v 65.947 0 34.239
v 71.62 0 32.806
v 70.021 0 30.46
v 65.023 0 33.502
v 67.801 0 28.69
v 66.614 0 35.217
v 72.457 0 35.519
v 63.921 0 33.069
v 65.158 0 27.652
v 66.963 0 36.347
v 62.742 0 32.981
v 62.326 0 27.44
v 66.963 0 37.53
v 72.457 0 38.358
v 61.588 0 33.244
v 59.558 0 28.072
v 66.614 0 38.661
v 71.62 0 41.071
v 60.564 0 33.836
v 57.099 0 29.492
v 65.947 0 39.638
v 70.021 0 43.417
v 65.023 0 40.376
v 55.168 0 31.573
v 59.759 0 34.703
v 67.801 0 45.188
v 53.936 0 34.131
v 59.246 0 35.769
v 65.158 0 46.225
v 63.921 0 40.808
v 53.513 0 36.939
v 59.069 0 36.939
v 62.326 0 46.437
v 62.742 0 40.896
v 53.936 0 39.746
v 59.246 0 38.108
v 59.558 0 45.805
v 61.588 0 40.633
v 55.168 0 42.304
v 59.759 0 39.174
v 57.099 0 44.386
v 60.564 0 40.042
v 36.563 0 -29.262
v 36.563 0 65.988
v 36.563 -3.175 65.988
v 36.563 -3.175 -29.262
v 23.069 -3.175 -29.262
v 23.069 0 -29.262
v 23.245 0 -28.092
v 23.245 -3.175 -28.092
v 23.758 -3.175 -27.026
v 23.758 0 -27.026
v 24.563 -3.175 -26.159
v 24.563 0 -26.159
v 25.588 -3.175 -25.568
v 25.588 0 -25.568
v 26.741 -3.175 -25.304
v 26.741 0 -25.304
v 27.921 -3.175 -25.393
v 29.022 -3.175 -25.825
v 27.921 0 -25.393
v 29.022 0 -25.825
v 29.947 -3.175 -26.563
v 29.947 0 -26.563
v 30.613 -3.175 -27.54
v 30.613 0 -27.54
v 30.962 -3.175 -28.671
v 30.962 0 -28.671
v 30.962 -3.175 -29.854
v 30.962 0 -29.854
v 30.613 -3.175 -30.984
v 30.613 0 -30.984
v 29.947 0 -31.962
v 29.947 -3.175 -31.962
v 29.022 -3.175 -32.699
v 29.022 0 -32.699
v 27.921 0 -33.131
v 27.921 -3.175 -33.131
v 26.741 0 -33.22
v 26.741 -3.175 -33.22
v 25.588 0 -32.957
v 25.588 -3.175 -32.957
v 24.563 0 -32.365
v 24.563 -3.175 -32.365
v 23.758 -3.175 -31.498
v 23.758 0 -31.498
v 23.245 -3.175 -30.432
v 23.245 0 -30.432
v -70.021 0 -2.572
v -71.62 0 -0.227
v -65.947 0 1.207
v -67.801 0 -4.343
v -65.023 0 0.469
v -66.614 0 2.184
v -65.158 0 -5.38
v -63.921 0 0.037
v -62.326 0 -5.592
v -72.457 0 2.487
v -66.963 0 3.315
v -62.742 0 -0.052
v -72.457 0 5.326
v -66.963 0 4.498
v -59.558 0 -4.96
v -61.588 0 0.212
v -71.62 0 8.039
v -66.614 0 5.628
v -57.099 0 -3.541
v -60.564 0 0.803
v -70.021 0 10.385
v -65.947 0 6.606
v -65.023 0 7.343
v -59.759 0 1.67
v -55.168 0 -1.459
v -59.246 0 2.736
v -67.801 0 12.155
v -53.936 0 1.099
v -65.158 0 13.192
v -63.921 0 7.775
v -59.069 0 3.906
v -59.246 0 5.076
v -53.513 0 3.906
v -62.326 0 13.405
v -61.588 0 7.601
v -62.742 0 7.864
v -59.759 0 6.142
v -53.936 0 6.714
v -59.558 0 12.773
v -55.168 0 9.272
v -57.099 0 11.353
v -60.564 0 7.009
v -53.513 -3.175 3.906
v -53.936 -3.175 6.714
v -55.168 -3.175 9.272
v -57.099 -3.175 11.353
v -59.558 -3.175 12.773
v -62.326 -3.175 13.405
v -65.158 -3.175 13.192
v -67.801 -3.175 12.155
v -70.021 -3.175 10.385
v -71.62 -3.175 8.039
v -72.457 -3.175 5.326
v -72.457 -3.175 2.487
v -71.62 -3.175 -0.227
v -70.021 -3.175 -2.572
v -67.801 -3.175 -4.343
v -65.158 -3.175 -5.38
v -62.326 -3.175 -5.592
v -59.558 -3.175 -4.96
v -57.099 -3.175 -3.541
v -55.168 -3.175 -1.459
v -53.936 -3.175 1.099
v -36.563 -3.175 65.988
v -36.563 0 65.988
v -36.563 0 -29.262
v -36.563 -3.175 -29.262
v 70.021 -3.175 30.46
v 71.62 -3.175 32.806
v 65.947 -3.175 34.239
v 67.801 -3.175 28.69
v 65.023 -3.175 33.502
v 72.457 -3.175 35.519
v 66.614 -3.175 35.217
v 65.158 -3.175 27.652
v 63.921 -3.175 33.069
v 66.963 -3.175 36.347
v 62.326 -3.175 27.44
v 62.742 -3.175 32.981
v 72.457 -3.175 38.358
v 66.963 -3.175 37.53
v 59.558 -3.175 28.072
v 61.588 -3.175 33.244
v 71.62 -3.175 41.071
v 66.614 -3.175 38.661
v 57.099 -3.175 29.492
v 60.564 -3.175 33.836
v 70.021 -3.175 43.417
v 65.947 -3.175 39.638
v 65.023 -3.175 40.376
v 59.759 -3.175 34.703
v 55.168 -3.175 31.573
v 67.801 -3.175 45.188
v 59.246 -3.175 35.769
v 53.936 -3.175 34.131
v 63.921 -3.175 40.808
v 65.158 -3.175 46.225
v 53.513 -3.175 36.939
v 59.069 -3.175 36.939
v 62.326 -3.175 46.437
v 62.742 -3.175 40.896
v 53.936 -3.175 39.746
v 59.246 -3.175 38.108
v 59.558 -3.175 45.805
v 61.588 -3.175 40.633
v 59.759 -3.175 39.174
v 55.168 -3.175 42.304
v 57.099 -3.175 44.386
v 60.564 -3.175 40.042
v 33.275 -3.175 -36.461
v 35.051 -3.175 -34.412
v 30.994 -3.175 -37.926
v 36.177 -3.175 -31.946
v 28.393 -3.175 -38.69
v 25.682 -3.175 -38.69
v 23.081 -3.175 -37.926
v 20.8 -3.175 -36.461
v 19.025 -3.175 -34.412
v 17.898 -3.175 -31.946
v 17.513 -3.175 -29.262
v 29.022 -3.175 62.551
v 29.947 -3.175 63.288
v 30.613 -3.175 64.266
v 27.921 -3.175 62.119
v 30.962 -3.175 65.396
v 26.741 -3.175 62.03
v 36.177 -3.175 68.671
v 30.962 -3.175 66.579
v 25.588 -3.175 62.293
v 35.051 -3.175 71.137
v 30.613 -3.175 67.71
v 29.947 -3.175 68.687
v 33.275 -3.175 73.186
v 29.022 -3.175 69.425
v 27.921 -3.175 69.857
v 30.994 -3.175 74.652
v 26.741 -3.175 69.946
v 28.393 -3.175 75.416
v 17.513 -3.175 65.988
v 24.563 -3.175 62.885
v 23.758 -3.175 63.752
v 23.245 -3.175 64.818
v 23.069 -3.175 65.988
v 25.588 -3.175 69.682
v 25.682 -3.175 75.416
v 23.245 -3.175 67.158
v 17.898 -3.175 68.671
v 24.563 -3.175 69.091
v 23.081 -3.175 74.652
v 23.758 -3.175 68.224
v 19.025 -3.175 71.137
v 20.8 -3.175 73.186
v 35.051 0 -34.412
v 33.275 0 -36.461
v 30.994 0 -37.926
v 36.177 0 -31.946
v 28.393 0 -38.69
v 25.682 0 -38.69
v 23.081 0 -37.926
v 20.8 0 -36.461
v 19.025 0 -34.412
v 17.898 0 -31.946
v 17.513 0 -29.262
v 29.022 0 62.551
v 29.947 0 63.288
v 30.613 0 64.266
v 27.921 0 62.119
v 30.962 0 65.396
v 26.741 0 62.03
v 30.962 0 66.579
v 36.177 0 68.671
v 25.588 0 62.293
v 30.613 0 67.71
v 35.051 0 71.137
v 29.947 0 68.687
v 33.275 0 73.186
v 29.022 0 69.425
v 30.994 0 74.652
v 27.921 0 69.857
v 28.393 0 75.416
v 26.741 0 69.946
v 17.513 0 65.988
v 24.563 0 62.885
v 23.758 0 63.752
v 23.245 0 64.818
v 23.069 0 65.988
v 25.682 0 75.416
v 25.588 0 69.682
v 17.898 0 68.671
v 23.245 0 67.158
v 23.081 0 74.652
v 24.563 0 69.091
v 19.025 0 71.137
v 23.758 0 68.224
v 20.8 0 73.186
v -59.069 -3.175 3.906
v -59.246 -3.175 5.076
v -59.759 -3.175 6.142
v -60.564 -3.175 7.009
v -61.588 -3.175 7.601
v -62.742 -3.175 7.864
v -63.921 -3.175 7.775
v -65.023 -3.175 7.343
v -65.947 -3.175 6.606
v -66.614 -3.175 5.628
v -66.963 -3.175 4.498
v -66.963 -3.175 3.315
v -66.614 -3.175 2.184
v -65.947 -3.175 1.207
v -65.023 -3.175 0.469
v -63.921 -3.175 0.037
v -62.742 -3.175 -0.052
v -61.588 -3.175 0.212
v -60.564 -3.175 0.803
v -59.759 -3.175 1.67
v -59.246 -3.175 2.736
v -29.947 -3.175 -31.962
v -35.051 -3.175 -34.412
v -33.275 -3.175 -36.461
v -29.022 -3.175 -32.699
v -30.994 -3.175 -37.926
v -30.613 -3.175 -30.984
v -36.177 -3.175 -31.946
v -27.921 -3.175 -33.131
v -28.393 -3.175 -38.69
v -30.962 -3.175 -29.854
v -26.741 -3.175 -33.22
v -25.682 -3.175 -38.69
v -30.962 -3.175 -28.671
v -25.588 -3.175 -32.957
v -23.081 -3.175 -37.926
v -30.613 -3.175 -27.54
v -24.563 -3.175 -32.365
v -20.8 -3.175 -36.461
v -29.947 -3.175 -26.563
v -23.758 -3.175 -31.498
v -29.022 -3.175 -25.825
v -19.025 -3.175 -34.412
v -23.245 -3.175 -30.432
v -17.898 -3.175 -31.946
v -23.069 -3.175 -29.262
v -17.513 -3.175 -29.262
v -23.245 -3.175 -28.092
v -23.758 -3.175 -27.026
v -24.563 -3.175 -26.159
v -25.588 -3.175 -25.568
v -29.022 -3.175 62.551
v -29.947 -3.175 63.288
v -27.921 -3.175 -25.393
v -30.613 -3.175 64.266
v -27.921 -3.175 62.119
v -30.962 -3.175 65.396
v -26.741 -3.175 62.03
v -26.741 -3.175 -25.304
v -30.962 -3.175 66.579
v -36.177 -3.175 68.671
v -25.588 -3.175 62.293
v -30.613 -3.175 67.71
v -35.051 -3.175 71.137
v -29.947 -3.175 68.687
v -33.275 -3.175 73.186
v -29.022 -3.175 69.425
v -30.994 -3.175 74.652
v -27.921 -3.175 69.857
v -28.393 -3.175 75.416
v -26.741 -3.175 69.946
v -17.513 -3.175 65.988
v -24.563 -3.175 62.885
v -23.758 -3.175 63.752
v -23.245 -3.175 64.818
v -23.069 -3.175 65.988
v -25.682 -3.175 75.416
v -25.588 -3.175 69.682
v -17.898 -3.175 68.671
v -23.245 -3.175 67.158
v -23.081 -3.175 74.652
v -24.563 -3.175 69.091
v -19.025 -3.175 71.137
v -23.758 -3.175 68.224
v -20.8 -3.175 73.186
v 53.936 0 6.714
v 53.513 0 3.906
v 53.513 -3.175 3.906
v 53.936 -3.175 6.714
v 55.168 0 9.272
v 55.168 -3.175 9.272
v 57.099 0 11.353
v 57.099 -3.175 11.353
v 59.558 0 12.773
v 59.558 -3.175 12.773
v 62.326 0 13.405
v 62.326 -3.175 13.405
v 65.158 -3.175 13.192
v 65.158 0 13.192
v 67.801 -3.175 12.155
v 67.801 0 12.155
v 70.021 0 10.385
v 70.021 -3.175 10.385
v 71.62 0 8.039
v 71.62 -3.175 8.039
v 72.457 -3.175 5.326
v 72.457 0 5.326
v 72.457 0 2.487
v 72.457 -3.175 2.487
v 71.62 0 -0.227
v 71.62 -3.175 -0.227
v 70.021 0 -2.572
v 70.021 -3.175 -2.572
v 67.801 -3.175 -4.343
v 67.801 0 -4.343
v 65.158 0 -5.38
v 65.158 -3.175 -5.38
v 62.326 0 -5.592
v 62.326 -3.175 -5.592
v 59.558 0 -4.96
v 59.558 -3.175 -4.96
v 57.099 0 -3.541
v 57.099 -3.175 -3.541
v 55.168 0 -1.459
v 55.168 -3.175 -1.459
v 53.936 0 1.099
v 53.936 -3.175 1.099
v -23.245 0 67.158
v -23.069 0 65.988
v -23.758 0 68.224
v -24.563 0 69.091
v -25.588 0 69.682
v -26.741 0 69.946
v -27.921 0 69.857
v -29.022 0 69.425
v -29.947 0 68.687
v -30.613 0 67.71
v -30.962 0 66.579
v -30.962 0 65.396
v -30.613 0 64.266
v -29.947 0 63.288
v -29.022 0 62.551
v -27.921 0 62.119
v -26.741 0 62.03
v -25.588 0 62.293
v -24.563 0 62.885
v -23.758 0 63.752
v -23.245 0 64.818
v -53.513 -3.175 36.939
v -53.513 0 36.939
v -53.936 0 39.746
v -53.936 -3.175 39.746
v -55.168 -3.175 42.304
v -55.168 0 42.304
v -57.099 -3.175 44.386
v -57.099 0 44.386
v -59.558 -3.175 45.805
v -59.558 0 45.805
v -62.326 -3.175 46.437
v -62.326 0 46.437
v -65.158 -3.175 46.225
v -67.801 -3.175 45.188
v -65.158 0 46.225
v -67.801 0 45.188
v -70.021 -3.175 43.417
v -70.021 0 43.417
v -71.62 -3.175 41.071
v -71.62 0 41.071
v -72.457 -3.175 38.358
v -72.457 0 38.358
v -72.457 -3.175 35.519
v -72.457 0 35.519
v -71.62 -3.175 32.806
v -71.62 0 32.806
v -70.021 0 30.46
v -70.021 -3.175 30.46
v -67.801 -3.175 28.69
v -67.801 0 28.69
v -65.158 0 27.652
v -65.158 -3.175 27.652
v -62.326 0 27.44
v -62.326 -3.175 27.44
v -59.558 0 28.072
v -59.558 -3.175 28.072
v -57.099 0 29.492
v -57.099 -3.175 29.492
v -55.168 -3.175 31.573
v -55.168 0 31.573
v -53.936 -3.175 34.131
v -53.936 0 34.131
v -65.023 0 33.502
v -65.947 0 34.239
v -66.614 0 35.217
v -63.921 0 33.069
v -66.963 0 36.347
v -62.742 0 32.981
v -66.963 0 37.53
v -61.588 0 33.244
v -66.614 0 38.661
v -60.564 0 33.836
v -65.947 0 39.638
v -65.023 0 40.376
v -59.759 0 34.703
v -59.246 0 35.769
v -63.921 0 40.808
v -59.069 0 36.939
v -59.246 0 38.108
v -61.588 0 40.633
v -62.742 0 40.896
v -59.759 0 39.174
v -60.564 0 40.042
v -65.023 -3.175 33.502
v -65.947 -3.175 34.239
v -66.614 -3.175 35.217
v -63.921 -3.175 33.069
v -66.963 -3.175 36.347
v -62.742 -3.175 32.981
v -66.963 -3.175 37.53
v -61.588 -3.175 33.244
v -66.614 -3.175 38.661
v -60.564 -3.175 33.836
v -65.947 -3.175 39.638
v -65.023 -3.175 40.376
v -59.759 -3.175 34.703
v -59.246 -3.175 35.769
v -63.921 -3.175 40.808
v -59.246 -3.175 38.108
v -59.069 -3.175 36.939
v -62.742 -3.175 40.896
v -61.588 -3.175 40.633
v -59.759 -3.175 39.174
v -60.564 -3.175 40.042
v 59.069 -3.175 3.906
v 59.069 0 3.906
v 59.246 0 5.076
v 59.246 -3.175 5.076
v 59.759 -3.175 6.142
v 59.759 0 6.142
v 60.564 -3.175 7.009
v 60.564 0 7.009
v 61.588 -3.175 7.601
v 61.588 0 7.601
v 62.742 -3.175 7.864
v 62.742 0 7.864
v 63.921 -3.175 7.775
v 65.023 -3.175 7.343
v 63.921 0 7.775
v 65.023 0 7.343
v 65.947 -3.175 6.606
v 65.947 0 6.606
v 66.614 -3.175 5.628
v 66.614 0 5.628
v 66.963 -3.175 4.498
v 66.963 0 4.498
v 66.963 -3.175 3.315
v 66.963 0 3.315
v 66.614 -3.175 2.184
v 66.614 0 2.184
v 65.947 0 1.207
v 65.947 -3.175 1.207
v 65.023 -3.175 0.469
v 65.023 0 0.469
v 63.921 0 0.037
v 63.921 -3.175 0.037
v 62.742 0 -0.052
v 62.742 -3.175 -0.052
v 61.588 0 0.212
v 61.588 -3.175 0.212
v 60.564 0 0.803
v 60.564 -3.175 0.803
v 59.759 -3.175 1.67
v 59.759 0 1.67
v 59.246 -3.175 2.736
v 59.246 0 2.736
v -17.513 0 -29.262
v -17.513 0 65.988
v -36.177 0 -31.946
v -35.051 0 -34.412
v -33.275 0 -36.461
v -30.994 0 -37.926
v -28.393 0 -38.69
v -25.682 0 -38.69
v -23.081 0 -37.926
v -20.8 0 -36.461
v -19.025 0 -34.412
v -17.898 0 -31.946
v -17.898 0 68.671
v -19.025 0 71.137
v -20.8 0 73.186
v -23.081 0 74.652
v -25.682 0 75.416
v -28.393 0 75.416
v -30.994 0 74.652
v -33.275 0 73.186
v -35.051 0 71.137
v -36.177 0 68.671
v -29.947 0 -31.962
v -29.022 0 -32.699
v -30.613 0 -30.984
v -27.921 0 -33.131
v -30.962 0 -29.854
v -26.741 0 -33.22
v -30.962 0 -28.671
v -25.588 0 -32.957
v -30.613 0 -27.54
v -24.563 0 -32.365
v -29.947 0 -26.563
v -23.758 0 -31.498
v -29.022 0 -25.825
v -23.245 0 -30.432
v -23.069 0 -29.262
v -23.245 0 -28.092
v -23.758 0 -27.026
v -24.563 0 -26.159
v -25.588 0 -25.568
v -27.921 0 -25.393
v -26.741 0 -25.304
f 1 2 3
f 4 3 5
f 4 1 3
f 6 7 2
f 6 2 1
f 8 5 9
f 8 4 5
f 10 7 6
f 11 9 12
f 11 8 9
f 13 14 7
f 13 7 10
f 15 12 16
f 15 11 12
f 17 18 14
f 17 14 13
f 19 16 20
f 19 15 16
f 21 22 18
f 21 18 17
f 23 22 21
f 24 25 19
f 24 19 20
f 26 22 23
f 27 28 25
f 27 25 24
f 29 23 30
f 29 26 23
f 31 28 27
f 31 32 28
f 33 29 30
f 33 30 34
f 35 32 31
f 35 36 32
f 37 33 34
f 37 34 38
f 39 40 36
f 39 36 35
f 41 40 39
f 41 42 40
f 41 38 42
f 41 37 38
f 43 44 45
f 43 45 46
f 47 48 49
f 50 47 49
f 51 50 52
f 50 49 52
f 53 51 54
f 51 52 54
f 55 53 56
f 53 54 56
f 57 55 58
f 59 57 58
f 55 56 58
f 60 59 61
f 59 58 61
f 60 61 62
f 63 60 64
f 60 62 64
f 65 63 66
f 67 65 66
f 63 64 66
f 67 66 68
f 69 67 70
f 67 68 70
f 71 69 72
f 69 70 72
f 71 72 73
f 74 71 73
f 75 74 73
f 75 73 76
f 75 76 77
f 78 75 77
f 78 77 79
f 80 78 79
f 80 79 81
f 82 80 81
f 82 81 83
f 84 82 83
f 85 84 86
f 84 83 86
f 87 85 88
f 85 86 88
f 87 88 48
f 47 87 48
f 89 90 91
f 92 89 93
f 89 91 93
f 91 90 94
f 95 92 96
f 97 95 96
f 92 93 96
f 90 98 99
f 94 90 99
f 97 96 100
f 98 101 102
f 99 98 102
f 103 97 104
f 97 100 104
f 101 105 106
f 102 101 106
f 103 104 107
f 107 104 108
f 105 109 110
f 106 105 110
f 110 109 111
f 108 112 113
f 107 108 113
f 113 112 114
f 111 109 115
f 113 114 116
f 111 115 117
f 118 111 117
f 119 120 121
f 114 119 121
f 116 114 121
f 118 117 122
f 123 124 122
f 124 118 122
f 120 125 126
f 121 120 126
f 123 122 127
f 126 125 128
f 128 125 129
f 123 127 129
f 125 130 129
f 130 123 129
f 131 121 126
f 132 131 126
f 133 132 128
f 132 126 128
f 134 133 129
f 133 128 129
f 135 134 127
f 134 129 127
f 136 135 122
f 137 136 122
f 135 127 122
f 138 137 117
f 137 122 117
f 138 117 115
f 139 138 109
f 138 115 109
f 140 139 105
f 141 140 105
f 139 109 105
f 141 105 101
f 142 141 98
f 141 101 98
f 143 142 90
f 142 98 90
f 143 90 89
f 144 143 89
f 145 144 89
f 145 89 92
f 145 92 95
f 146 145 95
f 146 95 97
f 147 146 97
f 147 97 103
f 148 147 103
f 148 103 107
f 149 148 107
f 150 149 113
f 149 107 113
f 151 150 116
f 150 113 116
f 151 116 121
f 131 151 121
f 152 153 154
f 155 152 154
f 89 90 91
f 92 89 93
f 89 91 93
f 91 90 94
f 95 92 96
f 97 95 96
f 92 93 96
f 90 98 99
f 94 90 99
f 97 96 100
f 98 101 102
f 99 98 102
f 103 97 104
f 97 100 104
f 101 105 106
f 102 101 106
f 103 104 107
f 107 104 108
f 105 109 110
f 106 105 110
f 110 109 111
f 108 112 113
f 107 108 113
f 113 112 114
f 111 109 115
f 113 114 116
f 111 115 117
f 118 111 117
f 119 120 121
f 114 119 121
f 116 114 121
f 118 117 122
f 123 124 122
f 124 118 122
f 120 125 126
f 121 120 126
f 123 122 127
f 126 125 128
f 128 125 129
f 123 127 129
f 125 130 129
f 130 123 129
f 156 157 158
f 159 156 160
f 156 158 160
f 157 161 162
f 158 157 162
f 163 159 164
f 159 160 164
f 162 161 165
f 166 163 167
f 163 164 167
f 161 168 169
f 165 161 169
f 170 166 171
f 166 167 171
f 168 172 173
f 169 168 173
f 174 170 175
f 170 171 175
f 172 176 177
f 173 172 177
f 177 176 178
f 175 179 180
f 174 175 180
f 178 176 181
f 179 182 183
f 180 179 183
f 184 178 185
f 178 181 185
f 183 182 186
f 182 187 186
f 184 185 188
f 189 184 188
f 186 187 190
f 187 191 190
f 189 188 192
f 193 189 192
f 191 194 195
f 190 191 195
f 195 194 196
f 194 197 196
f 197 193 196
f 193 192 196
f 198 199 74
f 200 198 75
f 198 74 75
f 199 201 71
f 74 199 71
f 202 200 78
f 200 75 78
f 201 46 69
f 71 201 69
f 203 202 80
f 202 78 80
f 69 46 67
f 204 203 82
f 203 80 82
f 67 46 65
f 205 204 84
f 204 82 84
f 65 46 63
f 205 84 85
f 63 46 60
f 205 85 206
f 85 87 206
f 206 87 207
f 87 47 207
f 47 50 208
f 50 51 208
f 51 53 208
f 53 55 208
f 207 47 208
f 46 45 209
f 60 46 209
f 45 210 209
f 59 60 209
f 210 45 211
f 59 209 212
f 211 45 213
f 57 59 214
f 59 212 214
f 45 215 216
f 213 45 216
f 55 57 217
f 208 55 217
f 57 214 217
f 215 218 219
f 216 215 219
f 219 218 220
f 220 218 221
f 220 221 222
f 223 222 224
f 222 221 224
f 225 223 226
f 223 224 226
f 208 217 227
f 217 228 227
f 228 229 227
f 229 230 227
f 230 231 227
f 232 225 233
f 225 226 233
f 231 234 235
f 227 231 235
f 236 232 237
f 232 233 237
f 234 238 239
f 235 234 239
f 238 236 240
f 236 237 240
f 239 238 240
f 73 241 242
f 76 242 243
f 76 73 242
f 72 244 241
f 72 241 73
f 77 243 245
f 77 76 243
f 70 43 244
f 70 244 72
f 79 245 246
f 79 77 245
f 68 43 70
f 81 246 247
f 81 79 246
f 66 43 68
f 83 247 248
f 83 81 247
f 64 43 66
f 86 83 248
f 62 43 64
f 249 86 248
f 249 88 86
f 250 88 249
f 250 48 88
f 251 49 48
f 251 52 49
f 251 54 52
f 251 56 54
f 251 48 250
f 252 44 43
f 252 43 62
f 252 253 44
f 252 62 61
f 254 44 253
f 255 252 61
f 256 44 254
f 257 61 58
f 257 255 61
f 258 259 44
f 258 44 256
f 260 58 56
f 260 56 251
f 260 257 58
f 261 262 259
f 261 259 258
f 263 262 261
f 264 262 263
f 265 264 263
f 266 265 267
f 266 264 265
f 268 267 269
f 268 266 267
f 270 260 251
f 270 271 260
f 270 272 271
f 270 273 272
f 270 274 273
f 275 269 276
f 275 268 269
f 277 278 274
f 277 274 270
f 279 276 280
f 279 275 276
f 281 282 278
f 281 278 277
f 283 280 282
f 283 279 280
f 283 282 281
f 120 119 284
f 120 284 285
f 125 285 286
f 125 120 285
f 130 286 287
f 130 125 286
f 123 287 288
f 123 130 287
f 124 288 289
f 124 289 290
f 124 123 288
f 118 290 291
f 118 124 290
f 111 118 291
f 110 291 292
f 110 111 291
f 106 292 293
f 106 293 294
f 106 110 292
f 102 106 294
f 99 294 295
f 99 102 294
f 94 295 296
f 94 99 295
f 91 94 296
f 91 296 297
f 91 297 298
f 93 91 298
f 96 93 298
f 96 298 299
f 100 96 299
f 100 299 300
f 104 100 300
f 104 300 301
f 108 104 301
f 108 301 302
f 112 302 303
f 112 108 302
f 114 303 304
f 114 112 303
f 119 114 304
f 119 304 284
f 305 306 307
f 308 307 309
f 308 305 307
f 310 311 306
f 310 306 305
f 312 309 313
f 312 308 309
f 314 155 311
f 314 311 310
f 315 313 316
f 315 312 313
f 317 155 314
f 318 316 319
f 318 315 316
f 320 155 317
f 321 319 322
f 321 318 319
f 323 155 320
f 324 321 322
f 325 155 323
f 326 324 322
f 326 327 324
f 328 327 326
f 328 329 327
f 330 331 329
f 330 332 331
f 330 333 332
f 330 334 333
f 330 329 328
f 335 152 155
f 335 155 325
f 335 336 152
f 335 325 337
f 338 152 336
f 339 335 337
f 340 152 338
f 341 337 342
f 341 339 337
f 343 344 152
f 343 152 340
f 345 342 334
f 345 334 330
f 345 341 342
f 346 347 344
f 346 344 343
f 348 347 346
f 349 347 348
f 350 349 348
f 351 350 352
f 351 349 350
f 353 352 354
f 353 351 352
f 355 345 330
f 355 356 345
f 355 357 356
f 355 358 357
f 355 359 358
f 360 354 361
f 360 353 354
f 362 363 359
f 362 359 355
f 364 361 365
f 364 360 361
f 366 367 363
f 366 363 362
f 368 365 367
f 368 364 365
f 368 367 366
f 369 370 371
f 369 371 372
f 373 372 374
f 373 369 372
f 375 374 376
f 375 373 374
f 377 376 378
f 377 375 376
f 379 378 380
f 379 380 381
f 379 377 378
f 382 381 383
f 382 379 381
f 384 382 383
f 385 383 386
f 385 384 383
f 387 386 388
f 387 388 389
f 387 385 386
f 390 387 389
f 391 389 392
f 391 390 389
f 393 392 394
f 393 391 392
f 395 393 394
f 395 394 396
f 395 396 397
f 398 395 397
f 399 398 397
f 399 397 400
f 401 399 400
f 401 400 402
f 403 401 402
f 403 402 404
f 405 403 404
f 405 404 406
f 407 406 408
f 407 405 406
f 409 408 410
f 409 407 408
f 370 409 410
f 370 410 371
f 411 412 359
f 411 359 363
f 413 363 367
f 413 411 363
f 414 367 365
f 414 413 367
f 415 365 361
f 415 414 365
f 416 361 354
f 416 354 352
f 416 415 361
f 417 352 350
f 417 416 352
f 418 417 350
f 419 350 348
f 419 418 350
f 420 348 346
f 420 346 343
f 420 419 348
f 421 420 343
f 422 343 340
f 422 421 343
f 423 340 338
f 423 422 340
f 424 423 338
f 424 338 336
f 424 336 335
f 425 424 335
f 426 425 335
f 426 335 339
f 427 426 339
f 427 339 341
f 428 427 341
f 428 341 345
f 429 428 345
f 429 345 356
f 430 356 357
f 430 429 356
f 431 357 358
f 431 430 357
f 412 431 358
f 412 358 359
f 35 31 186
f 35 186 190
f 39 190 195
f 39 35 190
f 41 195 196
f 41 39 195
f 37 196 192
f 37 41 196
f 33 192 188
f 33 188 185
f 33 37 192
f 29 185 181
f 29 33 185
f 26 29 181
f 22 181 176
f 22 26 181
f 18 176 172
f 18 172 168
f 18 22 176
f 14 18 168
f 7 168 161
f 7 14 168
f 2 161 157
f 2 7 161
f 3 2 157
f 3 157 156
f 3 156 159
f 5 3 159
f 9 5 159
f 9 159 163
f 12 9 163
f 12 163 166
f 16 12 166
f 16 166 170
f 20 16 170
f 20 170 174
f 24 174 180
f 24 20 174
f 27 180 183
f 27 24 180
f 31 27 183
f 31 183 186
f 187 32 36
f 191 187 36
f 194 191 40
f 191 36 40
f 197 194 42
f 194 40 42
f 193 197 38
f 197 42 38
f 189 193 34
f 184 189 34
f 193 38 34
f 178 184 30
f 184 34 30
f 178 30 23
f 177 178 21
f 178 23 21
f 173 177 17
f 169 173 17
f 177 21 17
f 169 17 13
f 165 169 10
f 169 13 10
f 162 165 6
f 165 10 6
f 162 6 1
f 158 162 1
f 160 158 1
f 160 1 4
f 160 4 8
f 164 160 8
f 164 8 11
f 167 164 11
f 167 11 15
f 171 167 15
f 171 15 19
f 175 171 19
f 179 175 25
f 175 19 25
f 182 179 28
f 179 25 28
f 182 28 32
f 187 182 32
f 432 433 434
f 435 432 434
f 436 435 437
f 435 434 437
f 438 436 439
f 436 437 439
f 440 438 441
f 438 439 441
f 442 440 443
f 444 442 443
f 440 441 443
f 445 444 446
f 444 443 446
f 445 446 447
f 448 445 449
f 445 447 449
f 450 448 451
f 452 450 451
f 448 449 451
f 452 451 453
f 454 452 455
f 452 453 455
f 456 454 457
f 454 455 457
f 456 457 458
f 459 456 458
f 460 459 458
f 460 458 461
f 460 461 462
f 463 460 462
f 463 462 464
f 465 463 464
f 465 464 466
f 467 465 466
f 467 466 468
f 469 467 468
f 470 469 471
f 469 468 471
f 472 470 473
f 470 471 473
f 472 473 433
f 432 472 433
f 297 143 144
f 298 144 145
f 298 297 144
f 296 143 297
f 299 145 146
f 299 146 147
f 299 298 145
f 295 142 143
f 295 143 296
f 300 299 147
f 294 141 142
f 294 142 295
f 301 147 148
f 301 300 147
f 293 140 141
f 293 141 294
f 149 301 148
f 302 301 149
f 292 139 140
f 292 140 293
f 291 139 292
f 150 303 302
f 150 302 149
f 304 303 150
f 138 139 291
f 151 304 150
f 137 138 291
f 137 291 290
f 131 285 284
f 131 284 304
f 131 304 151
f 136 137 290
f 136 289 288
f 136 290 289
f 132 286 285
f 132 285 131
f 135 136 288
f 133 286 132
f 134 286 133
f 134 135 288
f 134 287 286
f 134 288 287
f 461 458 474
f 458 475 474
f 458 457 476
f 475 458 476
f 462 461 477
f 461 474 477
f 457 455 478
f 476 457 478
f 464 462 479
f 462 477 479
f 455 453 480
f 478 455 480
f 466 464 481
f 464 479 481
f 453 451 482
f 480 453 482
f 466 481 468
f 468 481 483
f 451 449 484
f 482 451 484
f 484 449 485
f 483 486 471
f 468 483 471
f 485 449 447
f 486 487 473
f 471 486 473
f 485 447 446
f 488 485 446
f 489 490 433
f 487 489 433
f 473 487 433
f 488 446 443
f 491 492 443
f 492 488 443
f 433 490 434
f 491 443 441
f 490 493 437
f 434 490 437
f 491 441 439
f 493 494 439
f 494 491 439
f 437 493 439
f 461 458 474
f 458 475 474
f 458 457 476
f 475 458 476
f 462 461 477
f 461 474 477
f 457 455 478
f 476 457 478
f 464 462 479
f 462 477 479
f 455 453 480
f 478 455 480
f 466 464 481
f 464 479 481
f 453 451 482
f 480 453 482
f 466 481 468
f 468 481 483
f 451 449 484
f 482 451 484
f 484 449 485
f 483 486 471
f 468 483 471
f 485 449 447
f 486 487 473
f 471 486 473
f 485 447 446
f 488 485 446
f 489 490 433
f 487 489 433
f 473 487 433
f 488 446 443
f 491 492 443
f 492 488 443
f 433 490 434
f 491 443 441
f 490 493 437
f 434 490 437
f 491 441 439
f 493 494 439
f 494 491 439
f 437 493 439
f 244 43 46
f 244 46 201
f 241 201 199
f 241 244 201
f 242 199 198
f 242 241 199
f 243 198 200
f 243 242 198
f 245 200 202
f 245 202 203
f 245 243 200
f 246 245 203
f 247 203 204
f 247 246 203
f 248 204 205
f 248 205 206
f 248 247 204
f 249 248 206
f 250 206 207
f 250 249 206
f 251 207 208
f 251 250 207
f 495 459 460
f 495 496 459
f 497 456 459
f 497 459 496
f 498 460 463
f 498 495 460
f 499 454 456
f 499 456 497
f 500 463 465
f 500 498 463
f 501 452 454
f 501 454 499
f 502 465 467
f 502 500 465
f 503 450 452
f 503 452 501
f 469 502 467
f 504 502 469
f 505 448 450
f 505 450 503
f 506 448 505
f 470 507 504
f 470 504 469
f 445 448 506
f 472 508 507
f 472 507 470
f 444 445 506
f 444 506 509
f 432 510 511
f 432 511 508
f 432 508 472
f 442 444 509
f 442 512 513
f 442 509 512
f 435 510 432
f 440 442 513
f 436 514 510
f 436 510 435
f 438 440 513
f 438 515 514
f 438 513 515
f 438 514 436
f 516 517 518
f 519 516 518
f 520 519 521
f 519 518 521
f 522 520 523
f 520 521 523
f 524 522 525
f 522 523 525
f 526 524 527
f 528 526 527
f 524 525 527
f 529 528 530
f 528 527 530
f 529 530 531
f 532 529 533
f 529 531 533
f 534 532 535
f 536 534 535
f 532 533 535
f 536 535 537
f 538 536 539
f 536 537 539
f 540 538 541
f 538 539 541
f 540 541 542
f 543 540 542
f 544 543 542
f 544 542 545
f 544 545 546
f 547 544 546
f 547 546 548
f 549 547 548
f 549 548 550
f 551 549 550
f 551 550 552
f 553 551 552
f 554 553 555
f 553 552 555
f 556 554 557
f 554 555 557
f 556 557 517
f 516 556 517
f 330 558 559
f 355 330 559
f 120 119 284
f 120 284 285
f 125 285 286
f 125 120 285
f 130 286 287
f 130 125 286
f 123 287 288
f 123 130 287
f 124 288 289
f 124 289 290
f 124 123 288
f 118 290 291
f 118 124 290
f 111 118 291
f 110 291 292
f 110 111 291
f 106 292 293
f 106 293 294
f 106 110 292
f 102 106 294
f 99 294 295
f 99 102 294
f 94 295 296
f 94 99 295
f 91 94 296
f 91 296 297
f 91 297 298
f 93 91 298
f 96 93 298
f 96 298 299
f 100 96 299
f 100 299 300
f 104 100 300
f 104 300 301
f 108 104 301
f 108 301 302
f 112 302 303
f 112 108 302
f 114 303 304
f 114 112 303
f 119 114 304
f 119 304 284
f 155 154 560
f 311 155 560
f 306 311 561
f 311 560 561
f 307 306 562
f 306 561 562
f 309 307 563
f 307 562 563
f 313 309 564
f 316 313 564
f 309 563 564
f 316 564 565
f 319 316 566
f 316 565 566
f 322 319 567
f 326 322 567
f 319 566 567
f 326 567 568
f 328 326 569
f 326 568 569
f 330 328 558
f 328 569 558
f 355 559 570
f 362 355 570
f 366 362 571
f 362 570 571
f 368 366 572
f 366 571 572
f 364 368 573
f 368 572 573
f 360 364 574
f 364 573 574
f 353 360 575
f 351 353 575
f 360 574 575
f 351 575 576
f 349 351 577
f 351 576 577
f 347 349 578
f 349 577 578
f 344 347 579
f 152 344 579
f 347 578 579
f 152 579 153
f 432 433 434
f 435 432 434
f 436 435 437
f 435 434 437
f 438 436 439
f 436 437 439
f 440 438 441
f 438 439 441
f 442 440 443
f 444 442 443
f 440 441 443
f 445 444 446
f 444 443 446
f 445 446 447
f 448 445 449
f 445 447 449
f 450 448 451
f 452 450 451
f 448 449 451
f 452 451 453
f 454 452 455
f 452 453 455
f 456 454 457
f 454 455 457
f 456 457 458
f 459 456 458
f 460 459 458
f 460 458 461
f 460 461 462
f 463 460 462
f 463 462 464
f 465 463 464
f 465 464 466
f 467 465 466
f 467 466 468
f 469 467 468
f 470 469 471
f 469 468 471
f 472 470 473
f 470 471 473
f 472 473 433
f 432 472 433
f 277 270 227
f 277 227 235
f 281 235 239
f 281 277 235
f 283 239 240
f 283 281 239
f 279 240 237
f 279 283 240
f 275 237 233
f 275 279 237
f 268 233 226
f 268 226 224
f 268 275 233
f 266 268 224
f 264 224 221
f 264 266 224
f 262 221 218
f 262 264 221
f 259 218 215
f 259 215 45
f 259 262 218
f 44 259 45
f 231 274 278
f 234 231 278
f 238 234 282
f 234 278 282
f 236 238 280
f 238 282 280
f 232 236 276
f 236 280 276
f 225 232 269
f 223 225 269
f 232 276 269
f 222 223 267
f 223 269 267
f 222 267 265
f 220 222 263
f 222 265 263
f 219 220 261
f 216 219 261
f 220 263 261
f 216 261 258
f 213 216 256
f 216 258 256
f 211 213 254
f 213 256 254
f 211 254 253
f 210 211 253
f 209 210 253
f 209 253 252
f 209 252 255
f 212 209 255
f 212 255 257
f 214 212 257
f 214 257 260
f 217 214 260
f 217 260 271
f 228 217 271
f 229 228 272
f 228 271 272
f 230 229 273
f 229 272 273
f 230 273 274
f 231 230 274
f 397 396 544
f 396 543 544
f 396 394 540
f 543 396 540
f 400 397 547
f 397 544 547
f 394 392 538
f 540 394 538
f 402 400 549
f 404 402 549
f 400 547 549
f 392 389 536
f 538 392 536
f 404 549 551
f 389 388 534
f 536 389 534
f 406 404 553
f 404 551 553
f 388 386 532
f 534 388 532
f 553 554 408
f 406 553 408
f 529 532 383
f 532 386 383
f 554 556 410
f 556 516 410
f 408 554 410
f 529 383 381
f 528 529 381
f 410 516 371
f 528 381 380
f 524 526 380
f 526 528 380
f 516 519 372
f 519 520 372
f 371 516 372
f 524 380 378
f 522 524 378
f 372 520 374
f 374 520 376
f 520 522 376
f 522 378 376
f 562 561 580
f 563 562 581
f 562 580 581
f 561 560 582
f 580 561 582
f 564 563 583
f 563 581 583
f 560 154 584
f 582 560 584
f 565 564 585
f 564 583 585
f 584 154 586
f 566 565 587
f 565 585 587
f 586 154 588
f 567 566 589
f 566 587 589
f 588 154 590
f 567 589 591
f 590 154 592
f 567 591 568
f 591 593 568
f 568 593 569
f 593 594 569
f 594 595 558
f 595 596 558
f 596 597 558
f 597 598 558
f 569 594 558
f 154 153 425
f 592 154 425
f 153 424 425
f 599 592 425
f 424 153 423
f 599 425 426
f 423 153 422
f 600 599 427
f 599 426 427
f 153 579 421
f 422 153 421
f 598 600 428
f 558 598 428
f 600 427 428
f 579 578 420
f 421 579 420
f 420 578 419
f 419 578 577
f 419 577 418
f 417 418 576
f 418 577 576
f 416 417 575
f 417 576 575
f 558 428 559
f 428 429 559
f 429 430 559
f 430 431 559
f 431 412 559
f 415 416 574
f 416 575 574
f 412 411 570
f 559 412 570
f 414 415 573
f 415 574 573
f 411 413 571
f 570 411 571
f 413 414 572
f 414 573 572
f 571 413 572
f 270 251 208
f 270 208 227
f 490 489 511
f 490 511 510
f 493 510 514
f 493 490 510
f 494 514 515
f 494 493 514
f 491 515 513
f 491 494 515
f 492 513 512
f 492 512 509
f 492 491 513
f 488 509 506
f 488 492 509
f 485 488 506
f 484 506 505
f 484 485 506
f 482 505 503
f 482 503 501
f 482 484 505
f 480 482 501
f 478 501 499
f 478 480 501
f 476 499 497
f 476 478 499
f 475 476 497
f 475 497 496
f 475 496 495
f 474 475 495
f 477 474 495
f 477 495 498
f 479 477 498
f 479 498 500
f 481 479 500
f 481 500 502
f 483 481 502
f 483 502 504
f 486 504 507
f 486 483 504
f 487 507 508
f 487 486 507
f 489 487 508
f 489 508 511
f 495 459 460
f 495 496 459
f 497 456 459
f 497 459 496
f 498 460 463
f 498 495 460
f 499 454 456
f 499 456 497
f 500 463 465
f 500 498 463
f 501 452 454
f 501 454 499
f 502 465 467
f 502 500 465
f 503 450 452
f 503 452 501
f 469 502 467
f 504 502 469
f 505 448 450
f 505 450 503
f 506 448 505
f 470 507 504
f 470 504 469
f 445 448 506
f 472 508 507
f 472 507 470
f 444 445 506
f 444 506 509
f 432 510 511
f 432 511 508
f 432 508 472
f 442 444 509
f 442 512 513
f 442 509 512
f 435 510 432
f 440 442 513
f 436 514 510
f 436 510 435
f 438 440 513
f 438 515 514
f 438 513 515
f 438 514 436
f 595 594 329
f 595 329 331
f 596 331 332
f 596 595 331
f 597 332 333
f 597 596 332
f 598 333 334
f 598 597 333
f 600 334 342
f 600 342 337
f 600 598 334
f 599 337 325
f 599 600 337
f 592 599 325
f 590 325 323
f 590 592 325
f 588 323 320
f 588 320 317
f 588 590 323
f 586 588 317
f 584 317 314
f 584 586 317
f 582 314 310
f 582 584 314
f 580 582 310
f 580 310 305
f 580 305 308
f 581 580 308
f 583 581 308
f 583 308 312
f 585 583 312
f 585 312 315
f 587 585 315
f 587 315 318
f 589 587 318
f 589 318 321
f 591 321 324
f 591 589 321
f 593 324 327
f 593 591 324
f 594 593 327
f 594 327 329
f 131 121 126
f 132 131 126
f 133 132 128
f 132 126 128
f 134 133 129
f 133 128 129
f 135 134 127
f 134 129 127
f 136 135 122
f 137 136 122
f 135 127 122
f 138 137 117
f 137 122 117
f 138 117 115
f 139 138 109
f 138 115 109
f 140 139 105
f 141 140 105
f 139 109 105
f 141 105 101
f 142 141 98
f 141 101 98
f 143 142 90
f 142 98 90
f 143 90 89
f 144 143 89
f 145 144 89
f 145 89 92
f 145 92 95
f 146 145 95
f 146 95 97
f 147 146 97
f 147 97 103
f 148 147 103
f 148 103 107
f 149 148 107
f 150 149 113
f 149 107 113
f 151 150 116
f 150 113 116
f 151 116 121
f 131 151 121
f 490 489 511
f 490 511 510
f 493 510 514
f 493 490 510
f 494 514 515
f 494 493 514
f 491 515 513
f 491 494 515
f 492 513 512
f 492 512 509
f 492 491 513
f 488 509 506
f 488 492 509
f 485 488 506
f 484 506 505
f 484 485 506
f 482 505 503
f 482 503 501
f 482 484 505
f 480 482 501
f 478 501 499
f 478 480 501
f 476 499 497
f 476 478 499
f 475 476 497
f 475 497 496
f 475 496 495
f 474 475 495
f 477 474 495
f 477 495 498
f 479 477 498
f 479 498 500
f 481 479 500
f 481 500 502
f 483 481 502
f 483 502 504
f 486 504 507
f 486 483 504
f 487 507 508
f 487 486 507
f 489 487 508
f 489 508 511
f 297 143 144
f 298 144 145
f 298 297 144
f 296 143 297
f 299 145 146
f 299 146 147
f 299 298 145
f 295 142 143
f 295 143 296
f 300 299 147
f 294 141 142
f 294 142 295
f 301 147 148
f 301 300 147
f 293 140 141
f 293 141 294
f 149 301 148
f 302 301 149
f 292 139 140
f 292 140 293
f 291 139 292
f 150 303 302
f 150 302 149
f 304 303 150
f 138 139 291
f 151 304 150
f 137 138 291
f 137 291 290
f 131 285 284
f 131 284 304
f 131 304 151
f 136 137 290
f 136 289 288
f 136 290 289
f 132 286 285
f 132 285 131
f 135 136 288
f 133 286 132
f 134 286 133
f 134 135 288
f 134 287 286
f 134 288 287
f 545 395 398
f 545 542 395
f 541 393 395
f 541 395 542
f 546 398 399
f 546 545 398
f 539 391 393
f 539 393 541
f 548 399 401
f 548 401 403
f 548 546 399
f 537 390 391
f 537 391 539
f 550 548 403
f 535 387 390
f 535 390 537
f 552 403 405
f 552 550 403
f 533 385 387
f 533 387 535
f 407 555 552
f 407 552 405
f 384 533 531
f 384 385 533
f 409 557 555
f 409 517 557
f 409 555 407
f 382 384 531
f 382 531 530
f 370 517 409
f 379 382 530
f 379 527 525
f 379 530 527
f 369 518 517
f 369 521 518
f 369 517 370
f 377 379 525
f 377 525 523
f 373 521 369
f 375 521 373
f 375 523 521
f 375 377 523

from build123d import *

# Parameters (mm, degrees)
F0_R     = 9.525
F0_R_2   = 3.96875
F1_DEPTH = 3.175
F3_DEPTH = 3.175


with BuildPart() as f1:
    # F0 (on Front) → F1 (new body)
    with BuildSketch(Plane.XZ):
        with Locations((-63.0381852388, 36.9386635721)):
            Circle(F0_R)
        with Locations((-63.0381852388, 36.9386635721)):
            Circle(F0_R_2, mode=Mode.SUBTRACT)
    extrude(amount=F1_DEPTH)


with BuildPart() as f1b:
    # F0 (on Front) → F1, piece 2 (new body)
    with BuildSketch(Plane.XZ):
        with Locations((-63.0381852388, 3.9061459247)):
            Circle(F0_R)
        with Locations((-63.0381852388, 3.9061459247)):
            Circle(F0_R_2, mode=Mode.SUBTRACT)
    extrude(amount=F1_DEPTH)


with BuildPart() as f1c:
    # F0 (on Front) → F1, piece 3 (new body)
    with BuildSketch(Plane.XZ):
        with BuildLine():
            ThreePointArc((-17.5126310602, 65.9878742009), (-27.0376310602, 75.5128742009), (-36.5626310602, 65.9878742009))
            Line((-36.5626310602, 65.9878742009), (-36.5626310602, -29.2621257991))
            ThreePointArc((-36.5626310602, -29.2621257991), (-27.0376310602, -38.7871257991), (-17.5126310602, -29.2621257991))
            Line((-17.5126310602, -29.2621257991), (-17.5126310602, 65.9878742009))
        make_face()
        with Locations((-27.0376310602, -29.2621257991)):
            Circle(F0_R_2, mode=Mode.SUBTRACT)
        with Locations((-27.0376310602, 65.9878742009)):
            Circle(F0_R_2, mode=Mode.SUBTRACT)
    extrude(amount=F1_DEPTH)


with BuildPart() as f2_1:
    # F2: instance of F1c
    add(f1c.part.mirror(Plane.YZ))


with BuildPart() as f3:
    # F0 (on Front) → F3 (new body)
    with BuildSketch(Plane.XZ):
        with Locations((-63.0381852388, 36.9386635721)):
            Circle(F0_R)
        with Locations((-63.0381852388, 36.9386635721)):
            Circle(F0_R_2, mode=Mode.SUBTRACT)
    extrude(amount=F3_DEPTH)


with BuildPart() as f3b:
    # F0 (on Front) → F3, piece 2 (new body)
    with BuildSketch(Plane.XZ):
        with Locations((-63.0381852388, 3.9061459247)):
            Circle(F0_R)
        with Locations((-63.0381852388, 3.9061459247)):
            Circle(F0_R_2, mode=Mode.SUBTRACT)
    extrude(amount=F3_DEPTH)


with BuildPart() as f4_1:
    # F4: instance of F3
    add(f3.part.mirror(Plane.YZ))


with BuildPart() as f4_2:
    # F4: instance of F3b
    add(f3b.part.mirror(Plane.YZ))


solid = Compound([f1.part, f1b.part, f1c.part, f2_1.part, f3.part, f3b.part, f4_1.part, f4_2.part])
